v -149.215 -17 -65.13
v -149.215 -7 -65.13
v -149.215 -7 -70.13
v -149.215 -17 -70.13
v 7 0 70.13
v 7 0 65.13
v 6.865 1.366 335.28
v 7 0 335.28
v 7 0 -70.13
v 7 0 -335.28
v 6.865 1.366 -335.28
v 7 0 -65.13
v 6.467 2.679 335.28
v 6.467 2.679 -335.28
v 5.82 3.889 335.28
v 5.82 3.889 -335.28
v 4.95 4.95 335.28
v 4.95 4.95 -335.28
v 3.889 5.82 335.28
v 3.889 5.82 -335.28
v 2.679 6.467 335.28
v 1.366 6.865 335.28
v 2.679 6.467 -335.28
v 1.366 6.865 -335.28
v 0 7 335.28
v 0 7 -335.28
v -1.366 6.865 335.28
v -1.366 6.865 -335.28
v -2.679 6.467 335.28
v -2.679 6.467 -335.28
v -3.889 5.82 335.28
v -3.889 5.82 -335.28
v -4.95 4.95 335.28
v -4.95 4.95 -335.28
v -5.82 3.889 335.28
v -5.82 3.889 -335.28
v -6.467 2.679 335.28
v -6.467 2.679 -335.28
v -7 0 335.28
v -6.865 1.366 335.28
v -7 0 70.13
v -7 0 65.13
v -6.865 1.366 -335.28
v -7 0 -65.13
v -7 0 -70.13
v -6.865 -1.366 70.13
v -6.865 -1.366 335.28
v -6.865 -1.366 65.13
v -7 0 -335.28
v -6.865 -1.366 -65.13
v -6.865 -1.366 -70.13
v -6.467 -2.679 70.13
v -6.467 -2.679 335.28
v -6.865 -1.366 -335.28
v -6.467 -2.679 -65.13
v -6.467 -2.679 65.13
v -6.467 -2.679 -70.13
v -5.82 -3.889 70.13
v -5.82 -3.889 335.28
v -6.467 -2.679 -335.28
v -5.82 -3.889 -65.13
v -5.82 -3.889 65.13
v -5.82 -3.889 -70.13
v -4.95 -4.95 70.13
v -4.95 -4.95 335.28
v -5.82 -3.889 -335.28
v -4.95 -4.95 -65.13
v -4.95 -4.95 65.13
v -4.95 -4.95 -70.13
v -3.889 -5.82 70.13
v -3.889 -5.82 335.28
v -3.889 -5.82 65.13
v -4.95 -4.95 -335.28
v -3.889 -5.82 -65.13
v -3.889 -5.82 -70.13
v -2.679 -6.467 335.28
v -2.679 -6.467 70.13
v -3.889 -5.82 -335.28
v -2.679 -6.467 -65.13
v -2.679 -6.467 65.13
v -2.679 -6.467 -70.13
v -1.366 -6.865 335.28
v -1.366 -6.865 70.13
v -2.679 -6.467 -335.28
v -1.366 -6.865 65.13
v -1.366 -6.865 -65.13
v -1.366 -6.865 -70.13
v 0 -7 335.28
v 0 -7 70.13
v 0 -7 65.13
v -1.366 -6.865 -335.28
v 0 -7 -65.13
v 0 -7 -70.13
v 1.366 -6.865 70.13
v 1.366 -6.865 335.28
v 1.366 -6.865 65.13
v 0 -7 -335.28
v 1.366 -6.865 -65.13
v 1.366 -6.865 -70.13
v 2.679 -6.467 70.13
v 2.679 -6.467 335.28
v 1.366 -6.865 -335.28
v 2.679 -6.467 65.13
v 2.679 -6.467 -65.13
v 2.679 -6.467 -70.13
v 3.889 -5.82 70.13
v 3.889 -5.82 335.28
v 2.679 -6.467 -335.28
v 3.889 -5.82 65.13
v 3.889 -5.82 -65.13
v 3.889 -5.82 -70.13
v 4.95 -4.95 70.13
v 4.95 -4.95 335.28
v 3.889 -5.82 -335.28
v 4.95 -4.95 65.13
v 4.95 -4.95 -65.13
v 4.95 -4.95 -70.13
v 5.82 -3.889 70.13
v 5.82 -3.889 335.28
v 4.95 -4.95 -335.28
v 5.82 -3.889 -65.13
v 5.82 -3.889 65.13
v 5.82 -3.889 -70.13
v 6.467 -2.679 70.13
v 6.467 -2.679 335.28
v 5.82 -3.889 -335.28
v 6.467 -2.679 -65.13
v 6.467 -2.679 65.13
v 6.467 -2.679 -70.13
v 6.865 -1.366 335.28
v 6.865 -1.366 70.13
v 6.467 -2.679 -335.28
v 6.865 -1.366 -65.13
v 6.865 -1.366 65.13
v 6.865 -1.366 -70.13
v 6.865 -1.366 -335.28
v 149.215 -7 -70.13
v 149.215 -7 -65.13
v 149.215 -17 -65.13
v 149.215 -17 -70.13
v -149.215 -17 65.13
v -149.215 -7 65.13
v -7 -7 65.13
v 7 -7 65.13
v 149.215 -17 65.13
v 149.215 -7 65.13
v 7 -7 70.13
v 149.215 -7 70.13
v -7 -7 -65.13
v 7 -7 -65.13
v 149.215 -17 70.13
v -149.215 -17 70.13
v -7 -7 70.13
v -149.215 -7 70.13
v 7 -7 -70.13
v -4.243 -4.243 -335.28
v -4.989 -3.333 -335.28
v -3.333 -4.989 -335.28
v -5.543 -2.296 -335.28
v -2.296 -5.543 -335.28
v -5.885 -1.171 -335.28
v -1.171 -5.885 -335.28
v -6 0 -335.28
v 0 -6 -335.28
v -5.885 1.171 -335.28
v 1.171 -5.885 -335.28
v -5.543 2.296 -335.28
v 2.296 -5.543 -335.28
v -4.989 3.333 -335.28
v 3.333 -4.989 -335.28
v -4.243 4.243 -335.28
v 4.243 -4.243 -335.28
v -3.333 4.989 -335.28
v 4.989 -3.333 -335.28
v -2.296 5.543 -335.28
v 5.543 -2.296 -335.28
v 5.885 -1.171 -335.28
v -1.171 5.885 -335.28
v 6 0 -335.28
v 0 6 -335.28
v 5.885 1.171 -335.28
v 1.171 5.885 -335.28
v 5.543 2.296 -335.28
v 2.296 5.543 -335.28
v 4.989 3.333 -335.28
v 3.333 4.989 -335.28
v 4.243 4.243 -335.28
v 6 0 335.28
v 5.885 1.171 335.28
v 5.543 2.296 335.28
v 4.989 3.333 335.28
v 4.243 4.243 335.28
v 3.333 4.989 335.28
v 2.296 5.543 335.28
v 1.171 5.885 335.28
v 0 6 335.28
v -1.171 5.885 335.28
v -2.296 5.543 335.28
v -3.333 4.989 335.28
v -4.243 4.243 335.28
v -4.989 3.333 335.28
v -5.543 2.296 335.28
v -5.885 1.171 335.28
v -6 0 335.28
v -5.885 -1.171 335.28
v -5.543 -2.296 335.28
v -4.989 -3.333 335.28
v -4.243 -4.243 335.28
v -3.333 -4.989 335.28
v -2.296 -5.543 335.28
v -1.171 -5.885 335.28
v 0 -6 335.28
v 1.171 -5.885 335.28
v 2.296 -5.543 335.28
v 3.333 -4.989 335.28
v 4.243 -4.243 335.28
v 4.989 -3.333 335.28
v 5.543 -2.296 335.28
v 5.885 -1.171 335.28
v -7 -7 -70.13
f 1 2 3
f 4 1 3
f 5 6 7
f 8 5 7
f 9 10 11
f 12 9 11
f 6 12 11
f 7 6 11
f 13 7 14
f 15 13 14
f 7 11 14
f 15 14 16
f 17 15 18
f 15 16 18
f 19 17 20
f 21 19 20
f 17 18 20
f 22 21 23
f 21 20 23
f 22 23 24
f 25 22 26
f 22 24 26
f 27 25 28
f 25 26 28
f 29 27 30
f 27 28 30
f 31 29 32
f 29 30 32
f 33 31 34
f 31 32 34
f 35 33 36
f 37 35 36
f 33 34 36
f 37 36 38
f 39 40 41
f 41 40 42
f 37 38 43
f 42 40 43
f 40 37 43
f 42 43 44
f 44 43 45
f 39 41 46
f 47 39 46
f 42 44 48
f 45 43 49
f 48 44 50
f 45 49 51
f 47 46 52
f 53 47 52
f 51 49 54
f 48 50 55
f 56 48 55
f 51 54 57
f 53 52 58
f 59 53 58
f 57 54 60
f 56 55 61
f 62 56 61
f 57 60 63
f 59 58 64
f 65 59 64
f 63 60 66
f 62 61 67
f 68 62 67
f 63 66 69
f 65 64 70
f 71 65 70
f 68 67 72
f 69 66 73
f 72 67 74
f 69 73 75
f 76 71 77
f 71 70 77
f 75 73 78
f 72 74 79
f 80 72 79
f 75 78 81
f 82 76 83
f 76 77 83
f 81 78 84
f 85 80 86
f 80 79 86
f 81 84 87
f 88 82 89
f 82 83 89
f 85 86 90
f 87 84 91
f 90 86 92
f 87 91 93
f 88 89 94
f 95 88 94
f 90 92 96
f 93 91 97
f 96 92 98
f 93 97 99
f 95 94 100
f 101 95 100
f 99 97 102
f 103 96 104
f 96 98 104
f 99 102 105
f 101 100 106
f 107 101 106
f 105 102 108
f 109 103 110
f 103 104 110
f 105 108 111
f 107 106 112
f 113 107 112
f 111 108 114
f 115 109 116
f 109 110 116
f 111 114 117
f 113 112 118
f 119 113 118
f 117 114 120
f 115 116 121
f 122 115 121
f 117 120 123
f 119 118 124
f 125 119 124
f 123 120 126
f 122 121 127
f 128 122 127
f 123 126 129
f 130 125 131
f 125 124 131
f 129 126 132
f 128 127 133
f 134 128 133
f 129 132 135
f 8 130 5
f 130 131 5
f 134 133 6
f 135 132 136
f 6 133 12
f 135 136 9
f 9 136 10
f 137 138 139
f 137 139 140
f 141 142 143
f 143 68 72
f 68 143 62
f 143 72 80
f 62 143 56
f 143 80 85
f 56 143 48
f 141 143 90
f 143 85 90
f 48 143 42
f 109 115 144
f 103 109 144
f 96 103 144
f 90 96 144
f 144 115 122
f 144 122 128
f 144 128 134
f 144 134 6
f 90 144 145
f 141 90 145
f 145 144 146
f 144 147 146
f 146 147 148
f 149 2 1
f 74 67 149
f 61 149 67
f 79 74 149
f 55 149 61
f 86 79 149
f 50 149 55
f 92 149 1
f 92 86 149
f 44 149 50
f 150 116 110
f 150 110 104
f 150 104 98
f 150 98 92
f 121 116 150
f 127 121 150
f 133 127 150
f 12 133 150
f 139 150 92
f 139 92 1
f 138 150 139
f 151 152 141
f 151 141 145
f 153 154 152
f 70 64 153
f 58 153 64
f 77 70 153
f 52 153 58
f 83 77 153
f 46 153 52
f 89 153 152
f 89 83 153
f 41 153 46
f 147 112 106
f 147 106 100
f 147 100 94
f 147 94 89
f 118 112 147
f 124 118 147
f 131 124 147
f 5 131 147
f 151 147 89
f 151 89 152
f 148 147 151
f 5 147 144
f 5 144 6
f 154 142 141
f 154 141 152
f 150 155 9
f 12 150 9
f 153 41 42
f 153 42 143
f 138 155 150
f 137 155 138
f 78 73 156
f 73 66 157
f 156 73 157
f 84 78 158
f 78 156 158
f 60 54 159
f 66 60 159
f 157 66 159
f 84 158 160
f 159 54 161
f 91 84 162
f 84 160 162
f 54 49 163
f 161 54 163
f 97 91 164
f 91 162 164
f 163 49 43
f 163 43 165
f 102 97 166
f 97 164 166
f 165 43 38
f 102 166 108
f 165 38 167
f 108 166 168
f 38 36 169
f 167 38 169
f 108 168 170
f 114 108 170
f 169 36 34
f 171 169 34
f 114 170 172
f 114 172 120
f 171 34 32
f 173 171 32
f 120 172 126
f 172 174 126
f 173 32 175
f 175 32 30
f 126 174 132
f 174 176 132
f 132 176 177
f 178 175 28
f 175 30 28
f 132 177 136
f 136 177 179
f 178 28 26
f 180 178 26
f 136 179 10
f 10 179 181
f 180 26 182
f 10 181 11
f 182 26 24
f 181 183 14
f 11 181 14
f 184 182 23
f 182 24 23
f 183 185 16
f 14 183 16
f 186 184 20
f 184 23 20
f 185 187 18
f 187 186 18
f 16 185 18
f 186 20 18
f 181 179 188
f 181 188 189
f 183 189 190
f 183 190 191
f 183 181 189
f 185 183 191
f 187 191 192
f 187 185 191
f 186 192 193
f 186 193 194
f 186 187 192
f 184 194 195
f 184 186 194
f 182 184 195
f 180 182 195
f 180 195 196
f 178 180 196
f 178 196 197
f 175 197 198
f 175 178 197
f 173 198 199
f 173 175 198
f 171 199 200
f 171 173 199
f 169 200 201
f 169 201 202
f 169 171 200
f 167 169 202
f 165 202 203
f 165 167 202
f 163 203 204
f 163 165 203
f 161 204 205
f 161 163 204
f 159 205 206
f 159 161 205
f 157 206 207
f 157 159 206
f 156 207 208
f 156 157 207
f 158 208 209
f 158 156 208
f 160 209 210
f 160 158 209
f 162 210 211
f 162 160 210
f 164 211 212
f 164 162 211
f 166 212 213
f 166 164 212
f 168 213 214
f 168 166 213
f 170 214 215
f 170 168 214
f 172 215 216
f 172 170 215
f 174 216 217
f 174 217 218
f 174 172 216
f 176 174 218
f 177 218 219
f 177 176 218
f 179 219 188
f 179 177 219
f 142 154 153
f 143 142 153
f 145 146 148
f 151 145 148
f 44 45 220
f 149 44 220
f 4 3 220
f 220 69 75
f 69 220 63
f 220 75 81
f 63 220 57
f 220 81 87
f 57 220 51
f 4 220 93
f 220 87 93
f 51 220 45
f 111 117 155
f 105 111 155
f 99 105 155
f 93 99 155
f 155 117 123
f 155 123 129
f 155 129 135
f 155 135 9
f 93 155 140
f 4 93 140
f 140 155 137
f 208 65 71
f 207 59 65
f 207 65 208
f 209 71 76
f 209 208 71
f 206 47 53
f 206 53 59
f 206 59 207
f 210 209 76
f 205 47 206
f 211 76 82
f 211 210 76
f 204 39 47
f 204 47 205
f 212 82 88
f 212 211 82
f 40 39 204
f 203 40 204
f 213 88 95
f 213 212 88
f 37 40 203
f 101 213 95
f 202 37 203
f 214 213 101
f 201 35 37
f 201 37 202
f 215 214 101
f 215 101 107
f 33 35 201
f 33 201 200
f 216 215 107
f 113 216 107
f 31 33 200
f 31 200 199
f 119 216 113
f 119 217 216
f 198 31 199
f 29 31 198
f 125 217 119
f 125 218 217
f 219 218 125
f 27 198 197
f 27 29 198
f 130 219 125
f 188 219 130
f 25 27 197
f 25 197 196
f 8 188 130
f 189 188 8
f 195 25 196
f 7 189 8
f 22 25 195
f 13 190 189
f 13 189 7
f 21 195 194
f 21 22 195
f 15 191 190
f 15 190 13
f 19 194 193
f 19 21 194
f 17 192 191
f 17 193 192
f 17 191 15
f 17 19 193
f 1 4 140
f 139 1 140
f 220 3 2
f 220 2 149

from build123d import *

# Parameters (mm, degrees)
BOSS_EXTRUDE1_DEPTH      = 335.28
BOSS_EXTRUDE1_DEPTH_BACK = 335.28
SKETCH1_R                = 7
SKETCH1_R_2              = 6
SKETCH3_W                = 298.43
SKETCH3_H                = 5
BOSS_EXTRUDE2_DEPTH      = 10
BOSS_EXTRUDE3_START      = -70.13
BOSS_EXTRUDE3_DEPTH      = 5


with BuildPart() as part:
    # Sketch1 → Boss-Extrude1 (new, two sides: drawn at the far end of the back side and taken through both)
    with BuildSketch(Plane.XY.offset(-BOSS_EXTRUDE1_DEPTH_BACK)):
        Circle(SKETCH1_R)
        Circle(SKETCH1_R_2, mode=Mode.SUBTRACT)
    extrude(amount=BOSS_EXTRUDE1_DEPTH + BOSS_EXTRUDE1_DEPTH_BACK)



with BuildPart() as body_2:
    # Sketch3 → Boss-Extrude2 (new body)
    with BuildSketch(Plane(origin=(0, -7, 0), x_dir=(1, 0, 0), z_dir=(0, 1, 0))):
        with Locations((0, 67.63)):
            Rectangle(SKETCH3_W, SKETCH3_H)
    boss_extrude2 = extrude(amount=-BOSS_EXTRUDE2_DEPTH)


with BuildPart() as part_1:
    add(part.part)

    add(body_2.part)  # Boss-Extrude3 merges body 2
    # Boss-Extrude3: read off the stored shape, not the designer's step
    # Boss-Extrude3 outline → Boss-Extrude3 (add)
    with BuildSketch(Plane.XY.offset(BOSS_EXTRUDE3_START)):
        with BuildLine():
            Line((7, -7), (7, 0))
            ThreePointArc((7, 0), (4.94974746, -4.949747477), (-2.4e-08, -7))
            Line((-2.4e-08, -7), (7, -7))
        make_face()
        with BuildLine():
            ThreePointArc((-2.4e-08, -7), (-4.949747477, -4.94974746), (-7, 0))
            Line((-7, 0), (-7, -7))
            Line((-7, -7), (-2.4e-08, -7))
        make_face()
    boss_extrude3 = extrude(amount=BOSS_EXTRUDE3_DEPTH)

    # Mirror12: Boss-Extrude2, Boss-Extrude3 across plane
    add(boss_extrude2.mirror(Plane.XY))
    add(boss_extrude3.mirror(Plane.XY))


solid = part_1.part
